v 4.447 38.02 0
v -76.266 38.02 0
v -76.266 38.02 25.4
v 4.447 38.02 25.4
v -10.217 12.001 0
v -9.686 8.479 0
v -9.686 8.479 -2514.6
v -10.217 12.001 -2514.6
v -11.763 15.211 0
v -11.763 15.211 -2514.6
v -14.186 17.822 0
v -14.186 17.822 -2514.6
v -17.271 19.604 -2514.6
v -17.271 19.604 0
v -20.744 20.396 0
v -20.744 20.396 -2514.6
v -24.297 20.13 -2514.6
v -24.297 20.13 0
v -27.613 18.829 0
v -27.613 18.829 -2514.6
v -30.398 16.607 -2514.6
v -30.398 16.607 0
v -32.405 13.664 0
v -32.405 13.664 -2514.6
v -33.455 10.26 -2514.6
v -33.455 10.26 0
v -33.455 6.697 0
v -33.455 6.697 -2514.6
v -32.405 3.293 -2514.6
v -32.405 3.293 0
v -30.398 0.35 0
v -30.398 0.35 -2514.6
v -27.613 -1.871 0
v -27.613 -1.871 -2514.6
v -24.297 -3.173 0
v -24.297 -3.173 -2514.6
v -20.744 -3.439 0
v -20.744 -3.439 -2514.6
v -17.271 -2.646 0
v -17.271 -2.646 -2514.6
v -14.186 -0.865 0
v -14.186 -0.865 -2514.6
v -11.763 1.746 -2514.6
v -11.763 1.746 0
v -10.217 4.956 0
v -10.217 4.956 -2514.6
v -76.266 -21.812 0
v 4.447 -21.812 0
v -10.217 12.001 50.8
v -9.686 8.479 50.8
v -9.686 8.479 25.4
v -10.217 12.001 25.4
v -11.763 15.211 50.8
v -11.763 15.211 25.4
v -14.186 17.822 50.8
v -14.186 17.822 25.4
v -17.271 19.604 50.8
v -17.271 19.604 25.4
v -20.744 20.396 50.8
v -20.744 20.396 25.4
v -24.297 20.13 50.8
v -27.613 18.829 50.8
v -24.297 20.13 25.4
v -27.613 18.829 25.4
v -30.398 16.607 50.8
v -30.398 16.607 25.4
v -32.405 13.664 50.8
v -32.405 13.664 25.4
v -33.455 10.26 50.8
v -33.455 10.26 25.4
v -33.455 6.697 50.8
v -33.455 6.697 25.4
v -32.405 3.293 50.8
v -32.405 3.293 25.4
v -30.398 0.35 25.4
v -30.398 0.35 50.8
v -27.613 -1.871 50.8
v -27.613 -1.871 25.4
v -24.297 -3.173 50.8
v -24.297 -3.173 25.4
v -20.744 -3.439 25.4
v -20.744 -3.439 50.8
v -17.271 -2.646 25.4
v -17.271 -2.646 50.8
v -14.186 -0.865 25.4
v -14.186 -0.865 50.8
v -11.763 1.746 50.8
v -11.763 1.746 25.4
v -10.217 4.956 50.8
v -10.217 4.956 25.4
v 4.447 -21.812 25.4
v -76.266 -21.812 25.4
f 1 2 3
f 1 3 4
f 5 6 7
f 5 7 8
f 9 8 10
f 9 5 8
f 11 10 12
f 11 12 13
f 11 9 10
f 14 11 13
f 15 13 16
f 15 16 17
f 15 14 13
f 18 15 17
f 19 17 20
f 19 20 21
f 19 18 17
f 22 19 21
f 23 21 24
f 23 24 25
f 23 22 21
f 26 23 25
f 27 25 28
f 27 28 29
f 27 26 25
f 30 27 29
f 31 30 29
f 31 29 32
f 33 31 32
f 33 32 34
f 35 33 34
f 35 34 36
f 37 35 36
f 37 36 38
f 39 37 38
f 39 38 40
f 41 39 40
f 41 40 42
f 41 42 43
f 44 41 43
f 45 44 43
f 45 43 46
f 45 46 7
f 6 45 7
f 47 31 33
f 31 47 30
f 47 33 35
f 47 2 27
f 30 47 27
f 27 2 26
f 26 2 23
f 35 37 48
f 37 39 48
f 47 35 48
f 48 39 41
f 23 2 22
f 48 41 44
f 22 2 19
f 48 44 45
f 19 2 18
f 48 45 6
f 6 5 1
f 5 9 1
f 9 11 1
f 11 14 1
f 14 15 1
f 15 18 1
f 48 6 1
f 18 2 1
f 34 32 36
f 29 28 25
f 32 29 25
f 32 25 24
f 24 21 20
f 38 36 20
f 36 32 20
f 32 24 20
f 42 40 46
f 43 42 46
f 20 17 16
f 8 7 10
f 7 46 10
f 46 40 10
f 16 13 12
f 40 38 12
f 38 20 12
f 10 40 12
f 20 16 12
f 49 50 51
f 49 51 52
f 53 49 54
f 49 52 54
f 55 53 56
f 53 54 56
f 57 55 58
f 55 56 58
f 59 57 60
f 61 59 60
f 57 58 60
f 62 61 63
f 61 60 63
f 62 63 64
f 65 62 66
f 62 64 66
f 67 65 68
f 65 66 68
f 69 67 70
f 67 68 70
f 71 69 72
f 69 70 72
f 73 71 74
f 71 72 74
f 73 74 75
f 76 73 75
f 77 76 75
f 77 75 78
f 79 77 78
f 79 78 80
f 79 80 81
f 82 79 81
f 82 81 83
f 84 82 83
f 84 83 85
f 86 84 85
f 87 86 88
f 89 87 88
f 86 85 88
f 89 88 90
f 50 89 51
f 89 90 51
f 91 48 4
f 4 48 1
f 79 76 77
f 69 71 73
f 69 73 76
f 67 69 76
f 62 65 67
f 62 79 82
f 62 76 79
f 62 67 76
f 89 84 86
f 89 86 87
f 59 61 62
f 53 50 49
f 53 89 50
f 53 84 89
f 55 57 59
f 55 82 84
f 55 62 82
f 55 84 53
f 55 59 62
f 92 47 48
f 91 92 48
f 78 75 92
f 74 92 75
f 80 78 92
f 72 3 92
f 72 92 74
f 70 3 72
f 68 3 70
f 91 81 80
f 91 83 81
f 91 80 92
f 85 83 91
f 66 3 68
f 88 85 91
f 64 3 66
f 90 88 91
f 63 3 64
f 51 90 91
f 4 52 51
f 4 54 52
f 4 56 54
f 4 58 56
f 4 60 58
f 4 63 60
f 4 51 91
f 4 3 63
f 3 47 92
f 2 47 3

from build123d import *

# Parameters (mm, degrees)
F0_W          = 80.712397
F0_H          = 59.831567
F1_DEPTH      = 25.4
F2_R          = 11.951045
F3_DEPTH      = 25.4
F3_DEPTH_BACK = 2540


with BuildPart() as f1:
    # F0 (on Top) → F1 (new body)
    with BuildSketch(Plane.XY):
        with Locations((-35.909553, 8.104238)):
            Rectangle(F0_W, F0_H)
    extrude(amount=F1_DEPTH)

    # F2 (on face) → F3 (join, two sides)
    with BuildSketch(Plane.XY.offset(25.4)) as f3_sk:
        with Locations((-21.637337, 8.478672)):
            Circle(F2_R)
    extrude(amount=F3_DEPTH)
    extrude(f3_sk.sketch, amount=-F3_DEPTH_BACK)


solid = f1.part
